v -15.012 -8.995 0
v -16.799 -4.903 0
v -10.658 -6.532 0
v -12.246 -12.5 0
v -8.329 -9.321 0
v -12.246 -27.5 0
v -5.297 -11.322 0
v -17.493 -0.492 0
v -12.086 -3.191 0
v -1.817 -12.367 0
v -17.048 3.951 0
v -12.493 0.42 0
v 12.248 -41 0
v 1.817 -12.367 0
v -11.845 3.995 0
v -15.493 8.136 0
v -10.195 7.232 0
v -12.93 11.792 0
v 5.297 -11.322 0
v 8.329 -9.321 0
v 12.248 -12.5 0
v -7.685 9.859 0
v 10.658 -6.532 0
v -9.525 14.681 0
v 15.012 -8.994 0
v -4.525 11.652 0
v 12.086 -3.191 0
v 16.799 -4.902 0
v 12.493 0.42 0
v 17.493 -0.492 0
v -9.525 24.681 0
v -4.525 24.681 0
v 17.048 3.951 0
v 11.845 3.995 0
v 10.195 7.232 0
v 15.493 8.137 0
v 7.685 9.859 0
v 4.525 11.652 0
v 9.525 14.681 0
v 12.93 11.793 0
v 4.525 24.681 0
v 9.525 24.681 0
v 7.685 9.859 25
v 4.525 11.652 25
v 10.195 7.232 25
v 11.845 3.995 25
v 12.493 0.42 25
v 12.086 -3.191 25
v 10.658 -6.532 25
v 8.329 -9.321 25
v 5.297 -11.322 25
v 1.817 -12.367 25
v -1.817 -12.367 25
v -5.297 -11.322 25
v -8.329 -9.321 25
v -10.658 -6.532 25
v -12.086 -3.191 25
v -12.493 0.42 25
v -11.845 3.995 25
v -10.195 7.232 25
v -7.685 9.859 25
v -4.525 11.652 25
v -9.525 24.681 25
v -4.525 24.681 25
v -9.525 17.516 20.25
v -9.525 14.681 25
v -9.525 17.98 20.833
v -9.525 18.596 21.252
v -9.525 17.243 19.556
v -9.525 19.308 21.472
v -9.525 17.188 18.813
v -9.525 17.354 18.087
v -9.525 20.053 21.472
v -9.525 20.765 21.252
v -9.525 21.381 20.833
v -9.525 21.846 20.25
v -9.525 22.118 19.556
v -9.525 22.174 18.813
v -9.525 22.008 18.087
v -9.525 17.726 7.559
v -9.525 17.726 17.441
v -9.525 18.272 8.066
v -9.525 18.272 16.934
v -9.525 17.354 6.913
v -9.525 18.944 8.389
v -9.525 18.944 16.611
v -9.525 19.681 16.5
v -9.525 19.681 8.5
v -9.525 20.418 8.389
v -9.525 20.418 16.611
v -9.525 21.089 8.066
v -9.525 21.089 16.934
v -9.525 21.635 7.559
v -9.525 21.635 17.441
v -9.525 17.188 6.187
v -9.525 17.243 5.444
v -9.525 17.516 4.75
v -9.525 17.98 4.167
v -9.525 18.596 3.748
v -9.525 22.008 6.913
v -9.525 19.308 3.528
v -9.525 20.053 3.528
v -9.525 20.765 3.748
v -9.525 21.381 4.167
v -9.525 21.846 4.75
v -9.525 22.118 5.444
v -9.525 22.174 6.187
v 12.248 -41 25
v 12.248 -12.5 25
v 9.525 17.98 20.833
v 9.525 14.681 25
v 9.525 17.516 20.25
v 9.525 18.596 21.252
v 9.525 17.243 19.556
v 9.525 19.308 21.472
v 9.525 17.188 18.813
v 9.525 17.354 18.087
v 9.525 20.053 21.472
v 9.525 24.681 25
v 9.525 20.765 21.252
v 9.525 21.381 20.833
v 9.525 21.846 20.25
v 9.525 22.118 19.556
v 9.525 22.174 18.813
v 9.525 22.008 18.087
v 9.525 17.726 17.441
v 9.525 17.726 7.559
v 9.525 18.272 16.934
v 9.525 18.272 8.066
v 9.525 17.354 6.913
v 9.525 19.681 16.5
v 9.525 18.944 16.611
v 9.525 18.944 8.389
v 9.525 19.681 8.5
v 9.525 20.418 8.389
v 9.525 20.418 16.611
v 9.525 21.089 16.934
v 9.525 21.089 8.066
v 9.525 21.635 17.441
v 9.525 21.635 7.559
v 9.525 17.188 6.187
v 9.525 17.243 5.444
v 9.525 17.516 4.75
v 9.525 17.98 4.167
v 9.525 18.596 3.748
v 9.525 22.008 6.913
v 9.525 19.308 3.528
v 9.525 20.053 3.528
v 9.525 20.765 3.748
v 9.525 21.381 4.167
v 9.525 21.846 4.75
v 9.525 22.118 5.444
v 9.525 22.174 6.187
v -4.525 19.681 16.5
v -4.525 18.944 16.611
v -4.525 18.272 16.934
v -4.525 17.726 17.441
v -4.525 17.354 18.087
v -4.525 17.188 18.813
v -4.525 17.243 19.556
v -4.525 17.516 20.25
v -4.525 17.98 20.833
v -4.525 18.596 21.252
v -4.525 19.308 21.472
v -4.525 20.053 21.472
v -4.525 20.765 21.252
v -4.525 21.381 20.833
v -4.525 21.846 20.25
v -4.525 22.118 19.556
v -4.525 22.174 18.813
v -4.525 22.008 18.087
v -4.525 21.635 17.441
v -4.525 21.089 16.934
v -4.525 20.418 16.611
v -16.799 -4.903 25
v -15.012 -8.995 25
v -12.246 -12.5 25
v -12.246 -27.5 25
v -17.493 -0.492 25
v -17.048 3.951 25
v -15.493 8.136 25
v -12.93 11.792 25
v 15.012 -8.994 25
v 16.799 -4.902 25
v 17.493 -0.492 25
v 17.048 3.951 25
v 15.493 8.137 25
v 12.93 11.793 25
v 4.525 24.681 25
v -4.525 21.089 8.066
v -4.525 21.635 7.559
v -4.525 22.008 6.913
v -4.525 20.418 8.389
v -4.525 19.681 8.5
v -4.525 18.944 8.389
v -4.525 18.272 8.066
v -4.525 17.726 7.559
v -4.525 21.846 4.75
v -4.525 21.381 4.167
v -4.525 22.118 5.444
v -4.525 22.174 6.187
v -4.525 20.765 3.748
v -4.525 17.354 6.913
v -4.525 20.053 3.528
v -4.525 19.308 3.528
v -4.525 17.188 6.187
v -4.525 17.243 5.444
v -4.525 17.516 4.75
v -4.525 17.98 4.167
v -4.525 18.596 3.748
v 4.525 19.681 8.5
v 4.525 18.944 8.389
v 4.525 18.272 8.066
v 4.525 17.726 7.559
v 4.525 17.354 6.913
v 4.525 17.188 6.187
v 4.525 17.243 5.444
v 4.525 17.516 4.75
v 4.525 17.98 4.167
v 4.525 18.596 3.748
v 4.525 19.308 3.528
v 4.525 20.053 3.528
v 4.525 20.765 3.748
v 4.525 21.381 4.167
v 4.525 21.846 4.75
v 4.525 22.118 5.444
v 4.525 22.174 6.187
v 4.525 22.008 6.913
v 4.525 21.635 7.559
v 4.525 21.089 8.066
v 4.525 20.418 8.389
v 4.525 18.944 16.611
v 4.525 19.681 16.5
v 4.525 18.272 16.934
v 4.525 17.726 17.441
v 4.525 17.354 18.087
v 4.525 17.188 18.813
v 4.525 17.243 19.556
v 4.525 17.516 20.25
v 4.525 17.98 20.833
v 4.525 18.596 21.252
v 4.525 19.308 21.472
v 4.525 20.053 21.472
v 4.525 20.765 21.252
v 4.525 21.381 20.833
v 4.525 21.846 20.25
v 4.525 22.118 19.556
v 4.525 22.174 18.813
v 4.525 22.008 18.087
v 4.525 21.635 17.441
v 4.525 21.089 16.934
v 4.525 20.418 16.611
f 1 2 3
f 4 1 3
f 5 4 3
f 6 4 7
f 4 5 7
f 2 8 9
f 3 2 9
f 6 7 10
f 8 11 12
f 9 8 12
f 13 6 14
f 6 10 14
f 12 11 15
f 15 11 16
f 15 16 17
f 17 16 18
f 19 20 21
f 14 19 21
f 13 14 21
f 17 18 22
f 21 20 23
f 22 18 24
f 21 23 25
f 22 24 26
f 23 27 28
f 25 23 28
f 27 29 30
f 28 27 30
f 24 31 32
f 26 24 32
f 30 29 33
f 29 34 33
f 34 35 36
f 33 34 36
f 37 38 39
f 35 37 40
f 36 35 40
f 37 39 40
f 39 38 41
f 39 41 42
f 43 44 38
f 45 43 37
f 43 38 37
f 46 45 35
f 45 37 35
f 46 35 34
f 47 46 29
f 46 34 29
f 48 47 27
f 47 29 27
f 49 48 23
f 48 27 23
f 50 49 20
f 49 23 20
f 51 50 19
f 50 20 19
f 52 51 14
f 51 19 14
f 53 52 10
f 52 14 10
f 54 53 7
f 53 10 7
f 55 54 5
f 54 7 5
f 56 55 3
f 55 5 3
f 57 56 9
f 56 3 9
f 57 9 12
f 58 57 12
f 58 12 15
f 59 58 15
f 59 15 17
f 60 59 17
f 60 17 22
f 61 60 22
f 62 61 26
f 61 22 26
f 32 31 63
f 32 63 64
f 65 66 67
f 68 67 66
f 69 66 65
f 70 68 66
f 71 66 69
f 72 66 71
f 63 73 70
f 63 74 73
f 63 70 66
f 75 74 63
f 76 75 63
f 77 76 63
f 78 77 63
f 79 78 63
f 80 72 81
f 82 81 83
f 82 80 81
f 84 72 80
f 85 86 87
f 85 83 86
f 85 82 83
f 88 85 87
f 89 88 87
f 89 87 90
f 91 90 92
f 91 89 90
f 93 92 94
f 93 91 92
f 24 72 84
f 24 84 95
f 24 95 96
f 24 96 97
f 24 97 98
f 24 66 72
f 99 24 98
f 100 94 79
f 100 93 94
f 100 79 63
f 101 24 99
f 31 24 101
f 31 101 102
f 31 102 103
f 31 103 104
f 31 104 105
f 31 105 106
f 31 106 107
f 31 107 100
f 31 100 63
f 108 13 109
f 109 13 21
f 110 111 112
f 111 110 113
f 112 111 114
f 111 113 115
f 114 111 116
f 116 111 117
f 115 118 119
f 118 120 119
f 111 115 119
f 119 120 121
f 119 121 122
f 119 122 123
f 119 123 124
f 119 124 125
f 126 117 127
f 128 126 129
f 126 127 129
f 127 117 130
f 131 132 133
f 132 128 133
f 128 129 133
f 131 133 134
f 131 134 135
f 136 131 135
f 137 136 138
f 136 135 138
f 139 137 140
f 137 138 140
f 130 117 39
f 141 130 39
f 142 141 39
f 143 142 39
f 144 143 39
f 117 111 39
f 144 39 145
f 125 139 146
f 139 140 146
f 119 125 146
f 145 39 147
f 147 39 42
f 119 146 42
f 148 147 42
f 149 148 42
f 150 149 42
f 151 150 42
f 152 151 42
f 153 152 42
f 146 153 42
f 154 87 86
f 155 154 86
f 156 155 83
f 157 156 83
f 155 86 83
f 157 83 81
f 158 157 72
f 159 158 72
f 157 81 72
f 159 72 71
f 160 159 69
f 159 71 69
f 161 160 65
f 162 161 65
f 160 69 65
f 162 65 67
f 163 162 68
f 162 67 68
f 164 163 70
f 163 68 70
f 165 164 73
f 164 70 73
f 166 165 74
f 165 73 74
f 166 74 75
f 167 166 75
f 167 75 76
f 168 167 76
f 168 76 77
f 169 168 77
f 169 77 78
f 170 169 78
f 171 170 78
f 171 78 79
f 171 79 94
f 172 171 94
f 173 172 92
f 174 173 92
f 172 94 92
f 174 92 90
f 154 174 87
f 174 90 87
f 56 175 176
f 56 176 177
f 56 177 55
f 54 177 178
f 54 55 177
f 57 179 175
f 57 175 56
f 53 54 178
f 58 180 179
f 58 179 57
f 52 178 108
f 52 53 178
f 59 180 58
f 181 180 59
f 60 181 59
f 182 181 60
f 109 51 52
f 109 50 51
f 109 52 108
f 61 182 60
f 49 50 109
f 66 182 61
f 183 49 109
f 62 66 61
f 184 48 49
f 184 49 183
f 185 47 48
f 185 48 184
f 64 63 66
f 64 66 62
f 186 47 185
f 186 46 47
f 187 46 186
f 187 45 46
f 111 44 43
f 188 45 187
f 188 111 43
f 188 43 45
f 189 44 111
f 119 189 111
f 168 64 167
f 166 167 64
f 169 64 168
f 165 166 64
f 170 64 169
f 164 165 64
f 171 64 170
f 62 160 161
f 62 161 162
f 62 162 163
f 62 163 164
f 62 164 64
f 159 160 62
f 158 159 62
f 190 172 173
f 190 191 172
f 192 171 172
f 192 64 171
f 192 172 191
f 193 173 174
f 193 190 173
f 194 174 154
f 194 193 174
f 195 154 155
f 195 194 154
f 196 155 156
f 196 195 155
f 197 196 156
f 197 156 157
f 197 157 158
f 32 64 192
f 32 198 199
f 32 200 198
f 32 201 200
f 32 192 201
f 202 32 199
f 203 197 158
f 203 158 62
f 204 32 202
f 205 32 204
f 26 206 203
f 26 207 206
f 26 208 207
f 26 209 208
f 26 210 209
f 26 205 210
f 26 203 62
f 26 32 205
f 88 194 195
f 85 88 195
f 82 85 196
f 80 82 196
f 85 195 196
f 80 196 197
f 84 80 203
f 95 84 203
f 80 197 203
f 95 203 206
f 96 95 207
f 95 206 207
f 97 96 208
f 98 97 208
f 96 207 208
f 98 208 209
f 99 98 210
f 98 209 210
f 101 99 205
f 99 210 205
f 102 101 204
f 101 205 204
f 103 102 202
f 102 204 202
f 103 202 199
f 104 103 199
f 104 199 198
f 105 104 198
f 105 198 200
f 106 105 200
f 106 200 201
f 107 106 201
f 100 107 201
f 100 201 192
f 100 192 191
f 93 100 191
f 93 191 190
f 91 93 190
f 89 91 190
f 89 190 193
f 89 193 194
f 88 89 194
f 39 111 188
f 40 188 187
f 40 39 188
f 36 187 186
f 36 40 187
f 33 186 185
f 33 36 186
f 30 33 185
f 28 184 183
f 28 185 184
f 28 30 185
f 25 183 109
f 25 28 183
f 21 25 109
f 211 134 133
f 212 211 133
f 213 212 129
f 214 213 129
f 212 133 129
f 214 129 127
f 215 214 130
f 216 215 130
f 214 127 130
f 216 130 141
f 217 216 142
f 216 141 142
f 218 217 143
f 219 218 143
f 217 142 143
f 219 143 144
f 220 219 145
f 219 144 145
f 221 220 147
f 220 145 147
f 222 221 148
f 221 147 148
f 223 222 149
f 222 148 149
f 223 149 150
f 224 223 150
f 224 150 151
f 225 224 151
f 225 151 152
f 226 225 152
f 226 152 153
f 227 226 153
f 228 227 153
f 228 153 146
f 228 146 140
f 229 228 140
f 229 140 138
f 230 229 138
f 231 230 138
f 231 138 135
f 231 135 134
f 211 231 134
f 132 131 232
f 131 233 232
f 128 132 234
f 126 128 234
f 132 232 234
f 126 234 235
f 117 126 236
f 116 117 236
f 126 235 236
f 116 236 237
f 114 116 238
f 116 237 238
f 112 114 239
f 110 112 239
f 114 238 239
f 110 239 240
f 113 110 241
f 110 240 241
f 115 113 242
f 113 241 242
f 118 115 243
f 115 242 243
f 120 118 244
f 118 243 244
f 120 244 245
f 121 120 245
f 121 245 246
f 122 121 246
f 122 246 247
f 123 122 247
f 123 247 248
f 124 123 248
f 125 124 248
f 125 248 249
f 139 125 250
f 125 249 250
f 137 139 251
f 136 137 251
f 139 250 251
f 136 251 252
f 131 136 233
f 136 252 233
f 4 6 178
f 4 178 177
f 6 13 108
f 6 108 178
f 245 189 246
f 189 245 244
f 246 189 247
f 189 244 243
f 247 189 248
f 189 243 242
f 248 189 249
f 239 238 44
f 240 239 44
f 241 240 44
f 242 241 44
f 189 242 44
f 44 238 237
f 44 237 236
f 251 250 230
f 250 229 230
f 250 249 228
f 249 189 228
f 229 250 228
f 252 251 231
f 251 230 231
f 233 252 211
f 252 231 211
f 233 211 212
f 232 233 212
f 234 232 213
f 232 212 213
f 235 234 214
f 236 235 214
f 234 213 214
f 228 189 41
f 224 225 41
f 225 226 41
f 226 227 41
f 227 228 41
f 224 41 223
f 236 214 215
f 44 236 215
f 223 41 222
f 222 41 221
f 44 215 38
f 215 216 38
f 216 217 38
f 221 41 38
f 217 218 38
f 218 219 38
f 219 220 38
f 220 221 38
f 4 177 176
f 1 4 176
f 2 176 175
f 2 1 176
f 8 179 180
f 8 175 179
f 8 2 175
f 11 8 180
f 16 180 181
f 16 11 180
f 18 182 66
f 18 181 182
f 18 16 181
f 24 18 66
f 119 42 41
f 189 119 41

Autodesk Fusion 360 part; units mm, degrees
sketch "Sketch1" plane through (0, 0, 0) normal (0, 0, 1) x (1, 0, 0)
  circle A0 centre (0, 0) radius 12.5
  circle A1 centre (0, 0) radius 17.5
  line L0 (-9.525, 14.6807) -> (9.525, 14.6807)
  line L1 (-4.525, 11.6522) -> (-9.525, 11.6522)
  line L2 (-9.525, 11.6522) -> (-9.525, 24.6807)
  line L3 (-9.525, 24.6807) -> (-4.525, 24.6807)
  line L4 (-4.525, 24.6807) -> (-4.525, 11.6522)
  line L5 (4.525, 11.6522) -> (9.525, 11.6522)
  line L6 (9.525, 11.6522) -> (9.525, 24.6807)
  line L7 (9.525, 24.6807) -> (4.525, 24.6807)
  line L8 (4.525, 24.6807) -> (4.525, 11.6522)
  line L9 (0.0006, -27.5) -> (12.2475, -27.5)
  line L10 (12.2475, -27.5) -> (12.2475, -12.5)
  line L11 (12.2475, -12.5) -> (0.0006, -12.5)
  line L12 (0.0006, -12.5) -> (0.0006, -27.5)
  line L13 (-12.2462, -27.5) -> (-12.2462, -12.5)
  line L14 (0.0006, -27.5) -> (-12.2462, -27.5)
  line L15 (-12.2462, -12.5) -> (0.0006, -12.5)
  line L16 (12.2475, -27.5) -> (12.2475, -41)
  line L17 (12.2475, -41) -> (-12.2462, -27.5)
  dimension "d1" = 25
  dimension "d2" = 35
  dimension "d3" = 19.05
  dimension "d4" = 10
  dimension "d5" = 5
  dimension "d6" = 5
  dimension "d7" = 10
  dimension "d18" = 12.2468
  dimension "d19" = 15
  dimension "d27" = 13.5
extrude "Extrude1" add sketch "Sketch1" along normal blind 25 contours A0 A1 L5 L6 L11 | L0 L5 L6 L8 | A0 A1 L1 L2 L15 | A1 L11 L12 | A1 L12 L15 | L0 L1 L2 L4 | A1 L0 L8 | A1 L9 L10 L12 | A1 L12 L13 L14 | A1 L0 L4 | A1 L6 L7 L8 | L9 L14 L16 L17 | A1 L2 L3 L4
hole "Hole1" at (9.525, 19.6807, 19) direction (-1, 0, 0) diameter 5 depth 20 tip angle 180
hole "Hole2" at (-9.525, 19.6807, 6) direction (1, 0, 0) diameter 5 depth 20 tip angle 180
equation "d6 = d5"
equation "d7 = d4"
